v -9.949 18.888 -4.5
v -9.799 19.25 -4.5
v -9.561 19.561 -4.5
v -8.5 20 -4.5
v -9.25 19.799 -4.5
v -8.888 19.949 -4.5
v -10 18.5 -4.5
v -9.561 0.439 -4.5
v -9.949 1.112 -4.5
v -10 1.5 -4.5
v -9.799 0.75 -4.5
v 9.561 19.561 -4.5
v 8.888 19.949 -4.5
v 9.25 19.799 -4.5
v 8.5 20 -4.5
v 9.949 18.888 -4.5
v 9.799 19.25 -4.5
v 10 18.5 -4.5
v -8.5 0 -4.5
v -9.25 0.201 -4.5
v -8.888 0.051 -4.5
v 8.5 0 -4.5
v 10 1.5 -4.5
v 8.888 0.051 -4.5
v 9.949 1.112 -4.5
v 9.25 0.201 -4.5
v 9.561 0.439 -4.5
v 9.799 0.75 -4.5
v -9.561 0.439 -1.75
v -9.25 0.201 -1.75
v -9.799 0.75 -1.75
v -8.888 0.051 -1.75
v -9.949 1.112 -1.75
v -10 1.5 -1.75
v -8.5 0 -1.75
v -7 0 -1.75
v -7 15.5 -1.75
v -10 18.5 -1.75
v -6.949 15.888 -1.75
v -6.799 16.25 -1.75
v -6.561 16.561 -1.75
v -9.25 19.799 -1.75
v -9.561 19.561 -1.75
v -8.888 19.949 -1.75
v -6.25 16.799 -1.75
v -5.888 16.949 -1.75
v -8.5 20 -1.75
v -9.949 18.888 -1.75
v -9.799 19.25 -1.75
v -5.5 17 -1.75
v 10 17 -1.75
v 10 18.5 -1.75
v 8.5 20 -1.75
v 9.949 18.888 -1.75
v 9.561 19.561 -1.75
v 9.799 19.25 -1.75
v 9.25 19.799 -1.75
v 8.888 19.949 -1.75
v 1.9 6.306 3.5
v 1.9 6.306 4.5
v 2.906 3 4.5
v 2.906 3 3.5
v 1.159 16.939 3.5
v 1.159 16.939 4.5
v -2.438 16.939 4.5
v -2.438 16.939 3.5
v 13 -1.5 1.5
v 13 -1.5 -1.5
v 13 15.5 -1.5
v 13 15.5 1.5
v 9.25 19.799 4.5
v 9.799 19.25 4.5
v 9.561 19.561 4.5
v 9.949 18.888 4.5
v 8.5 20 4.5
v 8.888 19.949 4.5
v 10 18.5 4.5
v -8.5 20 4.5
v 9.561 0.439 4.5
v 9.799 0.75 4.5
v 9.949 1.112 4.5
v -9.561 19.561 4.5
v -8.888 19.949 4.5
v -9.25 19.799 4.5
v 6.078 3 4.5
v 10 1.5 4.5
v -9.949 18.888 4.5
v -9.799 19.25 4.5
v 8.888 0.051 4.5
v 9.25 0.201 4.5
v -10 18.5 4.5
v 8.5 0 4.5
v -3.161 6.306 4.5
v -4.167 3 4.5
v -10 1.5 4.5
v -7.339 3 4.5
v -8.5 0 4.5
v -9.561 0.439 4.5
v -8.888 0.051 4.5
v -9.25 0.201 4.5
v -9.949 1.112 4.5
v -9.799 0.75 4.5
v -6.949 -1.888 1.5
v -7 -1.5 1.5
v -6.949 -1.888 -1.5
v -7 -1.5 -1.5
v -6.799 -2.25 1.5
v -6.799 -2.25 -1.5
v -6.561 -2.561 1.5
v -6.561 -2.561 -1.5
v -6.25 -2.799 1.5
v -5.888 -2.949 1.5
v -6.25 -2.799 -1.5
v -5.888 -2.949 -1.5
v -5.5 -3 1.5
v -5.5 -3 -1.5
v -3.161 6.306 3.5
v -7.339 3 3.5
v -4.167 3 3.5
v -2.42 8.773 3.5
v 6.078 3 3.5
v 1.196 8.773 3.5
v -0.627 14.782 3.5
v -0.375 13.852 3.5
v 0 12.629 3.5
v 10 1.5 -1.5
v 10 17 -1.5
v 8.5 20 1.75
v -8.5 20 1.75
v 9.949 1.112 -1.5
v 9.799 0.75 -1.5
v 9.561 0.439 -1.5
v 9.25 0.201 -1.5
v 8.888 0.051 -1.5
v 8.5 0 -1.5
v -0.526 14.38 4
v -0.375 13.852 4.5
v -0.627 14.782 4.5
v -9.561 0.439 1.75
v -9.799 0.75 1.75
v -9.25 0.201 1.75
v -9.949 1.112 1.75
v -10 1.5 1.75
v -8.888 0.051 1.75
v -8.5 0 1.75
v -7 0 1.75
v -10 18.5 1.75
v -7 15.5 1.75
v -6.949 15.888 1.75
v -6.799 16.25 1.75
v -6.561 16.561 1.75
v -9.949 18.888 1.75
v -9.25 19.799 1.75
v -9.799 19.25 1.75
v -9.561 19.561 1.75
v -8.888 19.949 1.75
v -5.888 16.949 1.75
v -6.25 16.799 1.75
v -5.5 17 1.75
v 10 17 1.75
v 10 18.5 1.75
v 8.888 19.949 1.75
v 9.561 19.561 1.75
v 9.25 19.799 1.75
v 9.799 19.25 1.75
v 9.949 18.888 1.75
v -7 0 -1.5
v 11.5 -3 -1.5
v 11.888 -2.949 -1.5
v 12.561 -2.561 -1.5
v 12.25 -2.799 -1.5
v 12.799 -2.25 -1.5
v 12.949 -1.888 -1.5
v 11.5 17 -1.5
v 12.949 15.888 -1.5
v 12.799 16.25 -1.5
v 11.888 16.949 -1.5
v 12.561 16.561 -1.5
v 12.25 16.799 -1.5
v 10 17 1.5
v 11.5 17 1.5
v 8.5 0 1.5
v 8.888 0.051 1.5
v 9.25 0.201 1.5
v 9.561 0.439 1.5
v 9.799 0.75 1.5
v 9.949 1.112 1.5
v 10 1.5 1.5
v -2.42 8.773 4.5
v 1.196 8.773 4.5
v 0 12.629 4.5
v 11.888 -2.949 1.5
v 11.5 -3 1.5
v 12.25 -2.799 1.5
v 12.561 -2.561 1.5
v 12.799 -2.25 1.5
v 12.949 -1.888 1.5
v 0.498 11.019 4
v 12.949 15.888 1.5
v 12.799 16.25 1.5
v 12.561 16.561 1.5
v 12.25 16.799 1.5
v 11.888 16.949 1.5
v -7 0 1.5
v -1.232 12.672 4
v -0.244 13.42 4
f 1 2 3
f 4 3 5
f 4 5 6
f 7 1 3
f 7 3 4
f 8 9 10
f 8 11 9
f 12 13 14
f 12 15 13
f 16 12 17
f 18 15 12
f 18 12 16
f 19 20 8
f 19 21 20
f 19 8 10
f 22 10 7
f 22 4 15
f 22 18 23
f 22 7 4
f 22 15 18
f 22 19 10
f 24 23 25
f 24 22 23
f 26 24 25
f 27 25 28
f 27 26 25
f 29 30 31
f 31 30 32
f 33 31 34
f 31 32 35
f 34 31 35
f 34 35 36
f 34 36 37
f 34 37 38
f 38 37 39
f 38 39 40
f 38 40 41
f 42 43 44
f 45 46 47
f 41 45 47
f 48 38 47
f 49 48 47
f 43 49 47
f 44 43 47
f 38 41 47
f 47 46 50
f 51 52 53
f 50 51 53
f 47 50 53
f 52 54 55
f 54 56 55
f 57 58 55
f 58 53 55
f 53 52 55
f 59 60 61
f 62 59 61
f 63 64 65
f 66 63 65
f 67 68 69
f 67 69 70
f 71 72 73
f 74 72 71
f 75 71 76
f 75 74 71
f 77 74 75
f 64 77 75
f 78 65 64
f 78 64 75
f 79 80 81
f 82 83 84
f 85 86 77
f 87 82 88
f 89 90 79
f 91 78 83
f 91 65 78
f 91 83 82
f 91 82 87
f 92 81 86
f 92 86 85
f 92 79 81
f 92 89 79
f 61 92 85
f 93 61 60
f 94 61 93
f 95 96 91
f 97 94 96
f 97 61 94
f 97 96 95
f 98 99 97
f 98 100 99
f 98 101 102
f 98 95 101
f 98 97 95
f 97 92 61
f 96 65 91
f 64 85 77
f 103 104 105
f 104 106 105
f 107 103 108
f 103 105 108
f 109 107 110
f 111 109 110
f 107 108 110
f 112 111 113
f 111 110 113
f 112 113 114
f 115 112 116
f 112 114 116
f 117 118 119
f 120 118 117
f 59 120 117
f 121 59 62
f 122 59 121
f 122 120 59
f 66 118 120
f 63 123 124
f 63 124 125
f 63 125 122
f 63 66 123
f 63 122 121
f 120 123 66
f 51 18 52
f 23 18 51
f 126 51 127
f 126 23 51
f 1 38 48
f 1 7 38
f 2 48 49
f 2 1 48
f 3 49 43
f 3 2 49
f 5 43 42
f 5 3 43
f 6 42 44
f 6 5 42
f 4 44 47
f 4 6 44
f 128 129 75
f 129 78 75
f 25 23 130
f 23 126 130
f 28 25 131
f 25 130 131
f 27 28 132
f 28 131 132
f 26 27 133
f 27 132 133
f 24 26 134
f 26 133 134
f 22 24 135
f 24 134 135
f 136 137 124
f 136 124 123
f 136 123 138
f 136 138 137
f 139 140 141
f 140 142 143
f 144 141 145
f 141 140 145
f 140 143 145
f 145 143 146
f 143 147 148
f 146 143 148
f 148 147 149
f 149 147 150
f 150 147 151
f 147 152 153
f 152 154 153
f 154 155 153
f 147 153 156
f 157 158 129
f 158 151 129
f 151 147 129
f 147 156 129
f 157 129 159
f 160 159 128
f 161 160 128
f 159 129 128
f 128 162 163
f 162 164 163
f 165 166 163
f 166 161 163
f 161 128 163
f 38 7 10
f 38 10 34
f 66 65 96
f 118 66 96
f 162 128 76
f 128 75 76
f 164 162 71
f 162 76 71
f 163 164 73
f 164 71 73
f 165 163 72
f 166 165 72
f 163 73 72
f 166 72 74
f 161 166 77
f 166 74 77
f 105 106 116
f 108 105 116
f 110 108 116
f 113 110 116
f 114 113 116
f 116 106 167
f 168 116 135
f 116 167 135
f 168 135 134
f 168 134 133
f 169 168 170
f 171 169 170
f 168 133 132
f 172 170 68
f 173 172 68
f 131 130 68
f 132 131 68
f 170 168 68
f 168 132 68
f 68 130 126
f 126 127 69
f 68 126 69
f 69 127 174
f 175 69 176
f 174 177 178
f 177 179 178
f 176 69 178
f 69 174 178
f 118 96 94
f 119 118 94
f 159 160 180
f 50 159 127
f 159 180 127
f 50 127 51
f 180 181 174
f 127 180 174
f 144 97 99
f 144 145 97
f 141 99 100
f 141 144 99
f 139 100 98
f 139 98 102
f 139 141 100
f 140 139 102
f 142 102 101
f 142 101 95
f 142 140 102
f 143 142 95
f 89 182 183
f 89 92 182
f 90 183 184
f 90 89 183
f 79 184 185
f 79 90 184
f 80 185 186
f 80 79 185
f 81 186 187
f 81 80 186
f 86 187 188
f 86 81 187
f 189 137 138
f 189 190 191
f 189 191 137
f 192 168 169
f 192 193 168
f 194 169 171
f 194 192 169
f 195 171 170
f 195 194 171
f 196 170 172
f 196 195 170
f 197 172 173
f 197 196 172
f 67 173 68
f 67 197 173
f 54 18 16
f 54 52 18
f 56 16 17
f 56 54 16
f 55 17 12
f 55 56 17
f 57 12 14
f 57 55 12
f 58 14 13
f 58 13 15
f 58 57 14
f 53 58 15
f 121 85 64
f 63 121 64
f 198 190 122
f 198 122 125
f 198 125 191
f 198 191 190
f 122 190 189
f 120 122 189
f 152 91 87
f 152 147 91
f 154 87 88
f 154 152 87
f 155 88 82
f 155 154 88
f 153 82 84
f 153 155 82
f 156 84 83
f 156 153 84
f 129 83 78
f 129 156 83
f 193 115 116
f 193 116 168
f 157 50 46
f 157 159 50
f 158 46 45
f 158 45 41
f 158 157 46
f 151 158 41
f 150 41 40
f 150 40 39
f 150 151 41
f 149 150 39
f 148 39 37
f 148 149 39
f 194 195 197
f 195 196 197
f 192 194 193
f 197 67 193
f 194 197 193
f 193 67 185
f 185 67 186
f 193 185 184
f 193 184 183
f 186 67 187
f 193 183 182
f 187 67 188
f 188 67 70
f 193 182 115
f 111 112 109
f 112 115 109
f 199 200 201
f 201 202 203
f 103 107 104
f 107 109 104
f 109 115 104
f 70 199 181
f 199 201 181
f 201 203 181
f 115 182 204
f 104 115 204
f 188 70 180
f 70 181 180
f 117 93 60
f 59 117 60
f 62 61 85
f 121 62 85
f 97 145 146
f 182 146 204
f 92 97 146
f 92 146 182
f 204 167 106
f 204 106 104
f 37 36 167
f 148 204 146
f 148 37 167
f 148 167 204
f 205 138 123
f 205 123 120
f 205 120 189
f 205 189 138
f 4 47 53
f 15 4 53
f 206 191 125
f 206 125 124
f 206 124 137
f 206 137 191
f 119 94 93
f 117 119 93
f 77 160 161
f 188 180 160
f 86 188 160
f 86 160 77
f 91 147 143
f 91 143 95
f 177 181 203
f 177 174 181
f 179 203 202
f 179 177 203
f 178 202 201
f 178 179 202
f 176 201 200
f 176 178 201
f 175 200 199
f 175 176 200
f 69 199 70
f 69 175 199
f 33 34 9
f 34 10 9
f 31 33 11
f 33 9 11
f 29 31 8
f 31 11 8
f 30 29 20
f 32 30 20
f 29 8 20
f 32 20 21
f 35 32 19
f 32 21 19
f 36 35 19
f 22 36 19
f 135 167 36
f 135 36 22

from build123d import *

# Parameters (mm, degrees)
F0_W     = 14
F0_H     = 3
F0_W_2   = 3
F1_DEPTH = 20
F2_DEPTH = 3
F3_W     = 3
F3_H     = 3
F4_DEPTH = 100
F5_W     = 3
F5_H     = 3.5
F6_DEPTH = 100
F7_R     = 1.5
F9_DEPTH = 1


with BuildPart() as f1:
    # F0 (on Front) → F1 (new body)
    with BuildSketch(Plane.XZ):
        Polygon((10, 1.5), (10, 4.5), (-10, 4.5), (-10, 1.5), (-7, 1.5), (7, 1.5), align=None)
        Rectangle(F0_W, F0_H)
        with Locations((11.5, 0)):
            Rectangle(F0_W_2, F0_H)
        with Locations((8.5, 0)):
            Rectangle(F0_W_2, F0_H)
        with Locations((-8.5, 0)):
            Rectangle(F0_W_2, F0_H)
        Polygon((10, -4.5), (10, -1.5), (7, -1.5), (-7, -1.5), (-10, -1.5), (-10, -4.5), align=None)
    extrude(amount=-F1_DEPTH)

    # F0 (on Front) → F2 (join)
    with BuildSketch(Plane.XZ):
        with Locations((-8.5, 0)):
            Rectangle(F0_W_2, F0_H)
        Rectangle(F0_W, F0_H)
        with Locations((8.5, 0)):
            Rectangle(F0_W_2, F0_H)
        with Locations((11.5, 0)):
            Rectangle(F0_W_2, F0_H)
    extrude(amount=F2_DEPTH)

    # F3 (on face) → F4 (cut)
    with BuildSketch(Plane.YZ.offset(13)):
        Polygon((23, -1.75), (23, 1.75), (17, 1.75), (17, 1.5), (20, 1.5), (20, -1.5), (17, -1.5), (17, -1.75), align=None)
        with Locations((18.5, 0)):
            Rectangle(F3_W, F3_H)
    extrude(amount=-F4_DEPTH, mode=Mode.SUBTRACT)

    # F5 (on face) → F6 (cut)
    with BuildSketch(Plane(origin=(0, 17, 0), x_dir=(-1, 0, 0), z_dir=(0, 1, 0))):
        with Locations((11.5, 0)):
            Rectangle(F5_W, F5_H)
        with Locations((8.5, 0)):
            Rectangle(F5_W, F5_H)
    extrude(amount=-F6_DEPTH, mode=Mode.SUBTRACT)

    # F7
    f7_edges = [f1.edges().sort_by_distance(p)[0] for p in [
        (-7, -3, 0),
        (13, -3, 0),
        (10, 0, 3),
        (10, 0, -3),
        (-10, 0, -3.125),
        (-10, 0, 3.125),
        (-7, 17, 0),
        (-10, 20, 3.125),
        (-10, 20, -3.125),
        (13, 17, 0),
        (10, 20, 3.125),
        (10, 20, -3.125),
    ]]
    fillet(f7_edges, radius=F7_R)

    # F8 (on face) → F9 (cut)
    with BuildSketch(Plane.XY.offset(4.5)):
        with BuildLine():
            Line((0, 12.6293993567), (0, 16.9392361111))
            Line((0, 16.9392361111), (-2.4381510417, 16.9392361111))
            Line((-2.4381510417, 16.9392361111), (-7.3387586806, 3))
            Line((-7.3387586806, 3), (-4.1668836806, 3))
            Line((-4.1668836806, 3), (-3.1612413194, 6.3055555556))
            Line((-3.1612413194, 6.3055555556), (0, 6.3055555556))
            Line((0, 6.3055555556), (0, 8.7725694444))
            Line((0, 8.7725694444), (-2.419921875, 8.7725694444))
            add(Edge.make_bspline(
                [(-0.6273871528, 14.7821180556), (-0.9403211806, 13.5668402778), (-2.419921875, 8.7725694444)],
                knots=[0, 0, 0, 1, 1, 1], degree=2))
            add(Edge.make_bspline(
                [(-0.3752170139, 13.8524305556), (-0.5514322917, 14.4418402778), (-0.6273871528, 14.7821180556)],
                knots=[0, 0, 0, 1, 1, 1], degree=2))
            add(Edge.make_bspline(
                [(0, 12.6293993567), (-0.2996453455, 13.5996563543), (-0.3752170139, 13.8524305556)],
                knots=[0.5711400886, 0.5711400886, 0.5711400886, 1, 1, 1], degree=2))
        make_face()
        with BuildLine():
            Line((1.1590711806, 16.9392361111), (0, 16.9392361111))
            Line((0, 16.9392361111), (0, 12.6293993567))
            add(Edge.make_bspline(
                [(1.1955295139, 8.7725694444), (0.3990568122, 11.3372462484), (0, 12.6293993567)],
                knots=[0, 0, 0, 0.5711400886, 0.5711400886, 0.5711400886], degree=2))
            Line((1.1955295139, 8.7725694444), (0, 8.7725694444))
            Line((0, 8.7725694444), (0, 6.3055555556))
            Line((0, 6.3055555556), (1.900390625, 6.3055555556))
            Line((1.900390625, 6.3055555556), (2.9060329861, 3))
            Line((2.9060329861, 3), (6.0779079861, 3))
            Line((6.0779079861, 3), (1.1590711806, 16.9392361111))
        make_face()
    extrude(amount=-F9_DEPTH, mode=Mode.SUBTRACT)


solid = f1.part
